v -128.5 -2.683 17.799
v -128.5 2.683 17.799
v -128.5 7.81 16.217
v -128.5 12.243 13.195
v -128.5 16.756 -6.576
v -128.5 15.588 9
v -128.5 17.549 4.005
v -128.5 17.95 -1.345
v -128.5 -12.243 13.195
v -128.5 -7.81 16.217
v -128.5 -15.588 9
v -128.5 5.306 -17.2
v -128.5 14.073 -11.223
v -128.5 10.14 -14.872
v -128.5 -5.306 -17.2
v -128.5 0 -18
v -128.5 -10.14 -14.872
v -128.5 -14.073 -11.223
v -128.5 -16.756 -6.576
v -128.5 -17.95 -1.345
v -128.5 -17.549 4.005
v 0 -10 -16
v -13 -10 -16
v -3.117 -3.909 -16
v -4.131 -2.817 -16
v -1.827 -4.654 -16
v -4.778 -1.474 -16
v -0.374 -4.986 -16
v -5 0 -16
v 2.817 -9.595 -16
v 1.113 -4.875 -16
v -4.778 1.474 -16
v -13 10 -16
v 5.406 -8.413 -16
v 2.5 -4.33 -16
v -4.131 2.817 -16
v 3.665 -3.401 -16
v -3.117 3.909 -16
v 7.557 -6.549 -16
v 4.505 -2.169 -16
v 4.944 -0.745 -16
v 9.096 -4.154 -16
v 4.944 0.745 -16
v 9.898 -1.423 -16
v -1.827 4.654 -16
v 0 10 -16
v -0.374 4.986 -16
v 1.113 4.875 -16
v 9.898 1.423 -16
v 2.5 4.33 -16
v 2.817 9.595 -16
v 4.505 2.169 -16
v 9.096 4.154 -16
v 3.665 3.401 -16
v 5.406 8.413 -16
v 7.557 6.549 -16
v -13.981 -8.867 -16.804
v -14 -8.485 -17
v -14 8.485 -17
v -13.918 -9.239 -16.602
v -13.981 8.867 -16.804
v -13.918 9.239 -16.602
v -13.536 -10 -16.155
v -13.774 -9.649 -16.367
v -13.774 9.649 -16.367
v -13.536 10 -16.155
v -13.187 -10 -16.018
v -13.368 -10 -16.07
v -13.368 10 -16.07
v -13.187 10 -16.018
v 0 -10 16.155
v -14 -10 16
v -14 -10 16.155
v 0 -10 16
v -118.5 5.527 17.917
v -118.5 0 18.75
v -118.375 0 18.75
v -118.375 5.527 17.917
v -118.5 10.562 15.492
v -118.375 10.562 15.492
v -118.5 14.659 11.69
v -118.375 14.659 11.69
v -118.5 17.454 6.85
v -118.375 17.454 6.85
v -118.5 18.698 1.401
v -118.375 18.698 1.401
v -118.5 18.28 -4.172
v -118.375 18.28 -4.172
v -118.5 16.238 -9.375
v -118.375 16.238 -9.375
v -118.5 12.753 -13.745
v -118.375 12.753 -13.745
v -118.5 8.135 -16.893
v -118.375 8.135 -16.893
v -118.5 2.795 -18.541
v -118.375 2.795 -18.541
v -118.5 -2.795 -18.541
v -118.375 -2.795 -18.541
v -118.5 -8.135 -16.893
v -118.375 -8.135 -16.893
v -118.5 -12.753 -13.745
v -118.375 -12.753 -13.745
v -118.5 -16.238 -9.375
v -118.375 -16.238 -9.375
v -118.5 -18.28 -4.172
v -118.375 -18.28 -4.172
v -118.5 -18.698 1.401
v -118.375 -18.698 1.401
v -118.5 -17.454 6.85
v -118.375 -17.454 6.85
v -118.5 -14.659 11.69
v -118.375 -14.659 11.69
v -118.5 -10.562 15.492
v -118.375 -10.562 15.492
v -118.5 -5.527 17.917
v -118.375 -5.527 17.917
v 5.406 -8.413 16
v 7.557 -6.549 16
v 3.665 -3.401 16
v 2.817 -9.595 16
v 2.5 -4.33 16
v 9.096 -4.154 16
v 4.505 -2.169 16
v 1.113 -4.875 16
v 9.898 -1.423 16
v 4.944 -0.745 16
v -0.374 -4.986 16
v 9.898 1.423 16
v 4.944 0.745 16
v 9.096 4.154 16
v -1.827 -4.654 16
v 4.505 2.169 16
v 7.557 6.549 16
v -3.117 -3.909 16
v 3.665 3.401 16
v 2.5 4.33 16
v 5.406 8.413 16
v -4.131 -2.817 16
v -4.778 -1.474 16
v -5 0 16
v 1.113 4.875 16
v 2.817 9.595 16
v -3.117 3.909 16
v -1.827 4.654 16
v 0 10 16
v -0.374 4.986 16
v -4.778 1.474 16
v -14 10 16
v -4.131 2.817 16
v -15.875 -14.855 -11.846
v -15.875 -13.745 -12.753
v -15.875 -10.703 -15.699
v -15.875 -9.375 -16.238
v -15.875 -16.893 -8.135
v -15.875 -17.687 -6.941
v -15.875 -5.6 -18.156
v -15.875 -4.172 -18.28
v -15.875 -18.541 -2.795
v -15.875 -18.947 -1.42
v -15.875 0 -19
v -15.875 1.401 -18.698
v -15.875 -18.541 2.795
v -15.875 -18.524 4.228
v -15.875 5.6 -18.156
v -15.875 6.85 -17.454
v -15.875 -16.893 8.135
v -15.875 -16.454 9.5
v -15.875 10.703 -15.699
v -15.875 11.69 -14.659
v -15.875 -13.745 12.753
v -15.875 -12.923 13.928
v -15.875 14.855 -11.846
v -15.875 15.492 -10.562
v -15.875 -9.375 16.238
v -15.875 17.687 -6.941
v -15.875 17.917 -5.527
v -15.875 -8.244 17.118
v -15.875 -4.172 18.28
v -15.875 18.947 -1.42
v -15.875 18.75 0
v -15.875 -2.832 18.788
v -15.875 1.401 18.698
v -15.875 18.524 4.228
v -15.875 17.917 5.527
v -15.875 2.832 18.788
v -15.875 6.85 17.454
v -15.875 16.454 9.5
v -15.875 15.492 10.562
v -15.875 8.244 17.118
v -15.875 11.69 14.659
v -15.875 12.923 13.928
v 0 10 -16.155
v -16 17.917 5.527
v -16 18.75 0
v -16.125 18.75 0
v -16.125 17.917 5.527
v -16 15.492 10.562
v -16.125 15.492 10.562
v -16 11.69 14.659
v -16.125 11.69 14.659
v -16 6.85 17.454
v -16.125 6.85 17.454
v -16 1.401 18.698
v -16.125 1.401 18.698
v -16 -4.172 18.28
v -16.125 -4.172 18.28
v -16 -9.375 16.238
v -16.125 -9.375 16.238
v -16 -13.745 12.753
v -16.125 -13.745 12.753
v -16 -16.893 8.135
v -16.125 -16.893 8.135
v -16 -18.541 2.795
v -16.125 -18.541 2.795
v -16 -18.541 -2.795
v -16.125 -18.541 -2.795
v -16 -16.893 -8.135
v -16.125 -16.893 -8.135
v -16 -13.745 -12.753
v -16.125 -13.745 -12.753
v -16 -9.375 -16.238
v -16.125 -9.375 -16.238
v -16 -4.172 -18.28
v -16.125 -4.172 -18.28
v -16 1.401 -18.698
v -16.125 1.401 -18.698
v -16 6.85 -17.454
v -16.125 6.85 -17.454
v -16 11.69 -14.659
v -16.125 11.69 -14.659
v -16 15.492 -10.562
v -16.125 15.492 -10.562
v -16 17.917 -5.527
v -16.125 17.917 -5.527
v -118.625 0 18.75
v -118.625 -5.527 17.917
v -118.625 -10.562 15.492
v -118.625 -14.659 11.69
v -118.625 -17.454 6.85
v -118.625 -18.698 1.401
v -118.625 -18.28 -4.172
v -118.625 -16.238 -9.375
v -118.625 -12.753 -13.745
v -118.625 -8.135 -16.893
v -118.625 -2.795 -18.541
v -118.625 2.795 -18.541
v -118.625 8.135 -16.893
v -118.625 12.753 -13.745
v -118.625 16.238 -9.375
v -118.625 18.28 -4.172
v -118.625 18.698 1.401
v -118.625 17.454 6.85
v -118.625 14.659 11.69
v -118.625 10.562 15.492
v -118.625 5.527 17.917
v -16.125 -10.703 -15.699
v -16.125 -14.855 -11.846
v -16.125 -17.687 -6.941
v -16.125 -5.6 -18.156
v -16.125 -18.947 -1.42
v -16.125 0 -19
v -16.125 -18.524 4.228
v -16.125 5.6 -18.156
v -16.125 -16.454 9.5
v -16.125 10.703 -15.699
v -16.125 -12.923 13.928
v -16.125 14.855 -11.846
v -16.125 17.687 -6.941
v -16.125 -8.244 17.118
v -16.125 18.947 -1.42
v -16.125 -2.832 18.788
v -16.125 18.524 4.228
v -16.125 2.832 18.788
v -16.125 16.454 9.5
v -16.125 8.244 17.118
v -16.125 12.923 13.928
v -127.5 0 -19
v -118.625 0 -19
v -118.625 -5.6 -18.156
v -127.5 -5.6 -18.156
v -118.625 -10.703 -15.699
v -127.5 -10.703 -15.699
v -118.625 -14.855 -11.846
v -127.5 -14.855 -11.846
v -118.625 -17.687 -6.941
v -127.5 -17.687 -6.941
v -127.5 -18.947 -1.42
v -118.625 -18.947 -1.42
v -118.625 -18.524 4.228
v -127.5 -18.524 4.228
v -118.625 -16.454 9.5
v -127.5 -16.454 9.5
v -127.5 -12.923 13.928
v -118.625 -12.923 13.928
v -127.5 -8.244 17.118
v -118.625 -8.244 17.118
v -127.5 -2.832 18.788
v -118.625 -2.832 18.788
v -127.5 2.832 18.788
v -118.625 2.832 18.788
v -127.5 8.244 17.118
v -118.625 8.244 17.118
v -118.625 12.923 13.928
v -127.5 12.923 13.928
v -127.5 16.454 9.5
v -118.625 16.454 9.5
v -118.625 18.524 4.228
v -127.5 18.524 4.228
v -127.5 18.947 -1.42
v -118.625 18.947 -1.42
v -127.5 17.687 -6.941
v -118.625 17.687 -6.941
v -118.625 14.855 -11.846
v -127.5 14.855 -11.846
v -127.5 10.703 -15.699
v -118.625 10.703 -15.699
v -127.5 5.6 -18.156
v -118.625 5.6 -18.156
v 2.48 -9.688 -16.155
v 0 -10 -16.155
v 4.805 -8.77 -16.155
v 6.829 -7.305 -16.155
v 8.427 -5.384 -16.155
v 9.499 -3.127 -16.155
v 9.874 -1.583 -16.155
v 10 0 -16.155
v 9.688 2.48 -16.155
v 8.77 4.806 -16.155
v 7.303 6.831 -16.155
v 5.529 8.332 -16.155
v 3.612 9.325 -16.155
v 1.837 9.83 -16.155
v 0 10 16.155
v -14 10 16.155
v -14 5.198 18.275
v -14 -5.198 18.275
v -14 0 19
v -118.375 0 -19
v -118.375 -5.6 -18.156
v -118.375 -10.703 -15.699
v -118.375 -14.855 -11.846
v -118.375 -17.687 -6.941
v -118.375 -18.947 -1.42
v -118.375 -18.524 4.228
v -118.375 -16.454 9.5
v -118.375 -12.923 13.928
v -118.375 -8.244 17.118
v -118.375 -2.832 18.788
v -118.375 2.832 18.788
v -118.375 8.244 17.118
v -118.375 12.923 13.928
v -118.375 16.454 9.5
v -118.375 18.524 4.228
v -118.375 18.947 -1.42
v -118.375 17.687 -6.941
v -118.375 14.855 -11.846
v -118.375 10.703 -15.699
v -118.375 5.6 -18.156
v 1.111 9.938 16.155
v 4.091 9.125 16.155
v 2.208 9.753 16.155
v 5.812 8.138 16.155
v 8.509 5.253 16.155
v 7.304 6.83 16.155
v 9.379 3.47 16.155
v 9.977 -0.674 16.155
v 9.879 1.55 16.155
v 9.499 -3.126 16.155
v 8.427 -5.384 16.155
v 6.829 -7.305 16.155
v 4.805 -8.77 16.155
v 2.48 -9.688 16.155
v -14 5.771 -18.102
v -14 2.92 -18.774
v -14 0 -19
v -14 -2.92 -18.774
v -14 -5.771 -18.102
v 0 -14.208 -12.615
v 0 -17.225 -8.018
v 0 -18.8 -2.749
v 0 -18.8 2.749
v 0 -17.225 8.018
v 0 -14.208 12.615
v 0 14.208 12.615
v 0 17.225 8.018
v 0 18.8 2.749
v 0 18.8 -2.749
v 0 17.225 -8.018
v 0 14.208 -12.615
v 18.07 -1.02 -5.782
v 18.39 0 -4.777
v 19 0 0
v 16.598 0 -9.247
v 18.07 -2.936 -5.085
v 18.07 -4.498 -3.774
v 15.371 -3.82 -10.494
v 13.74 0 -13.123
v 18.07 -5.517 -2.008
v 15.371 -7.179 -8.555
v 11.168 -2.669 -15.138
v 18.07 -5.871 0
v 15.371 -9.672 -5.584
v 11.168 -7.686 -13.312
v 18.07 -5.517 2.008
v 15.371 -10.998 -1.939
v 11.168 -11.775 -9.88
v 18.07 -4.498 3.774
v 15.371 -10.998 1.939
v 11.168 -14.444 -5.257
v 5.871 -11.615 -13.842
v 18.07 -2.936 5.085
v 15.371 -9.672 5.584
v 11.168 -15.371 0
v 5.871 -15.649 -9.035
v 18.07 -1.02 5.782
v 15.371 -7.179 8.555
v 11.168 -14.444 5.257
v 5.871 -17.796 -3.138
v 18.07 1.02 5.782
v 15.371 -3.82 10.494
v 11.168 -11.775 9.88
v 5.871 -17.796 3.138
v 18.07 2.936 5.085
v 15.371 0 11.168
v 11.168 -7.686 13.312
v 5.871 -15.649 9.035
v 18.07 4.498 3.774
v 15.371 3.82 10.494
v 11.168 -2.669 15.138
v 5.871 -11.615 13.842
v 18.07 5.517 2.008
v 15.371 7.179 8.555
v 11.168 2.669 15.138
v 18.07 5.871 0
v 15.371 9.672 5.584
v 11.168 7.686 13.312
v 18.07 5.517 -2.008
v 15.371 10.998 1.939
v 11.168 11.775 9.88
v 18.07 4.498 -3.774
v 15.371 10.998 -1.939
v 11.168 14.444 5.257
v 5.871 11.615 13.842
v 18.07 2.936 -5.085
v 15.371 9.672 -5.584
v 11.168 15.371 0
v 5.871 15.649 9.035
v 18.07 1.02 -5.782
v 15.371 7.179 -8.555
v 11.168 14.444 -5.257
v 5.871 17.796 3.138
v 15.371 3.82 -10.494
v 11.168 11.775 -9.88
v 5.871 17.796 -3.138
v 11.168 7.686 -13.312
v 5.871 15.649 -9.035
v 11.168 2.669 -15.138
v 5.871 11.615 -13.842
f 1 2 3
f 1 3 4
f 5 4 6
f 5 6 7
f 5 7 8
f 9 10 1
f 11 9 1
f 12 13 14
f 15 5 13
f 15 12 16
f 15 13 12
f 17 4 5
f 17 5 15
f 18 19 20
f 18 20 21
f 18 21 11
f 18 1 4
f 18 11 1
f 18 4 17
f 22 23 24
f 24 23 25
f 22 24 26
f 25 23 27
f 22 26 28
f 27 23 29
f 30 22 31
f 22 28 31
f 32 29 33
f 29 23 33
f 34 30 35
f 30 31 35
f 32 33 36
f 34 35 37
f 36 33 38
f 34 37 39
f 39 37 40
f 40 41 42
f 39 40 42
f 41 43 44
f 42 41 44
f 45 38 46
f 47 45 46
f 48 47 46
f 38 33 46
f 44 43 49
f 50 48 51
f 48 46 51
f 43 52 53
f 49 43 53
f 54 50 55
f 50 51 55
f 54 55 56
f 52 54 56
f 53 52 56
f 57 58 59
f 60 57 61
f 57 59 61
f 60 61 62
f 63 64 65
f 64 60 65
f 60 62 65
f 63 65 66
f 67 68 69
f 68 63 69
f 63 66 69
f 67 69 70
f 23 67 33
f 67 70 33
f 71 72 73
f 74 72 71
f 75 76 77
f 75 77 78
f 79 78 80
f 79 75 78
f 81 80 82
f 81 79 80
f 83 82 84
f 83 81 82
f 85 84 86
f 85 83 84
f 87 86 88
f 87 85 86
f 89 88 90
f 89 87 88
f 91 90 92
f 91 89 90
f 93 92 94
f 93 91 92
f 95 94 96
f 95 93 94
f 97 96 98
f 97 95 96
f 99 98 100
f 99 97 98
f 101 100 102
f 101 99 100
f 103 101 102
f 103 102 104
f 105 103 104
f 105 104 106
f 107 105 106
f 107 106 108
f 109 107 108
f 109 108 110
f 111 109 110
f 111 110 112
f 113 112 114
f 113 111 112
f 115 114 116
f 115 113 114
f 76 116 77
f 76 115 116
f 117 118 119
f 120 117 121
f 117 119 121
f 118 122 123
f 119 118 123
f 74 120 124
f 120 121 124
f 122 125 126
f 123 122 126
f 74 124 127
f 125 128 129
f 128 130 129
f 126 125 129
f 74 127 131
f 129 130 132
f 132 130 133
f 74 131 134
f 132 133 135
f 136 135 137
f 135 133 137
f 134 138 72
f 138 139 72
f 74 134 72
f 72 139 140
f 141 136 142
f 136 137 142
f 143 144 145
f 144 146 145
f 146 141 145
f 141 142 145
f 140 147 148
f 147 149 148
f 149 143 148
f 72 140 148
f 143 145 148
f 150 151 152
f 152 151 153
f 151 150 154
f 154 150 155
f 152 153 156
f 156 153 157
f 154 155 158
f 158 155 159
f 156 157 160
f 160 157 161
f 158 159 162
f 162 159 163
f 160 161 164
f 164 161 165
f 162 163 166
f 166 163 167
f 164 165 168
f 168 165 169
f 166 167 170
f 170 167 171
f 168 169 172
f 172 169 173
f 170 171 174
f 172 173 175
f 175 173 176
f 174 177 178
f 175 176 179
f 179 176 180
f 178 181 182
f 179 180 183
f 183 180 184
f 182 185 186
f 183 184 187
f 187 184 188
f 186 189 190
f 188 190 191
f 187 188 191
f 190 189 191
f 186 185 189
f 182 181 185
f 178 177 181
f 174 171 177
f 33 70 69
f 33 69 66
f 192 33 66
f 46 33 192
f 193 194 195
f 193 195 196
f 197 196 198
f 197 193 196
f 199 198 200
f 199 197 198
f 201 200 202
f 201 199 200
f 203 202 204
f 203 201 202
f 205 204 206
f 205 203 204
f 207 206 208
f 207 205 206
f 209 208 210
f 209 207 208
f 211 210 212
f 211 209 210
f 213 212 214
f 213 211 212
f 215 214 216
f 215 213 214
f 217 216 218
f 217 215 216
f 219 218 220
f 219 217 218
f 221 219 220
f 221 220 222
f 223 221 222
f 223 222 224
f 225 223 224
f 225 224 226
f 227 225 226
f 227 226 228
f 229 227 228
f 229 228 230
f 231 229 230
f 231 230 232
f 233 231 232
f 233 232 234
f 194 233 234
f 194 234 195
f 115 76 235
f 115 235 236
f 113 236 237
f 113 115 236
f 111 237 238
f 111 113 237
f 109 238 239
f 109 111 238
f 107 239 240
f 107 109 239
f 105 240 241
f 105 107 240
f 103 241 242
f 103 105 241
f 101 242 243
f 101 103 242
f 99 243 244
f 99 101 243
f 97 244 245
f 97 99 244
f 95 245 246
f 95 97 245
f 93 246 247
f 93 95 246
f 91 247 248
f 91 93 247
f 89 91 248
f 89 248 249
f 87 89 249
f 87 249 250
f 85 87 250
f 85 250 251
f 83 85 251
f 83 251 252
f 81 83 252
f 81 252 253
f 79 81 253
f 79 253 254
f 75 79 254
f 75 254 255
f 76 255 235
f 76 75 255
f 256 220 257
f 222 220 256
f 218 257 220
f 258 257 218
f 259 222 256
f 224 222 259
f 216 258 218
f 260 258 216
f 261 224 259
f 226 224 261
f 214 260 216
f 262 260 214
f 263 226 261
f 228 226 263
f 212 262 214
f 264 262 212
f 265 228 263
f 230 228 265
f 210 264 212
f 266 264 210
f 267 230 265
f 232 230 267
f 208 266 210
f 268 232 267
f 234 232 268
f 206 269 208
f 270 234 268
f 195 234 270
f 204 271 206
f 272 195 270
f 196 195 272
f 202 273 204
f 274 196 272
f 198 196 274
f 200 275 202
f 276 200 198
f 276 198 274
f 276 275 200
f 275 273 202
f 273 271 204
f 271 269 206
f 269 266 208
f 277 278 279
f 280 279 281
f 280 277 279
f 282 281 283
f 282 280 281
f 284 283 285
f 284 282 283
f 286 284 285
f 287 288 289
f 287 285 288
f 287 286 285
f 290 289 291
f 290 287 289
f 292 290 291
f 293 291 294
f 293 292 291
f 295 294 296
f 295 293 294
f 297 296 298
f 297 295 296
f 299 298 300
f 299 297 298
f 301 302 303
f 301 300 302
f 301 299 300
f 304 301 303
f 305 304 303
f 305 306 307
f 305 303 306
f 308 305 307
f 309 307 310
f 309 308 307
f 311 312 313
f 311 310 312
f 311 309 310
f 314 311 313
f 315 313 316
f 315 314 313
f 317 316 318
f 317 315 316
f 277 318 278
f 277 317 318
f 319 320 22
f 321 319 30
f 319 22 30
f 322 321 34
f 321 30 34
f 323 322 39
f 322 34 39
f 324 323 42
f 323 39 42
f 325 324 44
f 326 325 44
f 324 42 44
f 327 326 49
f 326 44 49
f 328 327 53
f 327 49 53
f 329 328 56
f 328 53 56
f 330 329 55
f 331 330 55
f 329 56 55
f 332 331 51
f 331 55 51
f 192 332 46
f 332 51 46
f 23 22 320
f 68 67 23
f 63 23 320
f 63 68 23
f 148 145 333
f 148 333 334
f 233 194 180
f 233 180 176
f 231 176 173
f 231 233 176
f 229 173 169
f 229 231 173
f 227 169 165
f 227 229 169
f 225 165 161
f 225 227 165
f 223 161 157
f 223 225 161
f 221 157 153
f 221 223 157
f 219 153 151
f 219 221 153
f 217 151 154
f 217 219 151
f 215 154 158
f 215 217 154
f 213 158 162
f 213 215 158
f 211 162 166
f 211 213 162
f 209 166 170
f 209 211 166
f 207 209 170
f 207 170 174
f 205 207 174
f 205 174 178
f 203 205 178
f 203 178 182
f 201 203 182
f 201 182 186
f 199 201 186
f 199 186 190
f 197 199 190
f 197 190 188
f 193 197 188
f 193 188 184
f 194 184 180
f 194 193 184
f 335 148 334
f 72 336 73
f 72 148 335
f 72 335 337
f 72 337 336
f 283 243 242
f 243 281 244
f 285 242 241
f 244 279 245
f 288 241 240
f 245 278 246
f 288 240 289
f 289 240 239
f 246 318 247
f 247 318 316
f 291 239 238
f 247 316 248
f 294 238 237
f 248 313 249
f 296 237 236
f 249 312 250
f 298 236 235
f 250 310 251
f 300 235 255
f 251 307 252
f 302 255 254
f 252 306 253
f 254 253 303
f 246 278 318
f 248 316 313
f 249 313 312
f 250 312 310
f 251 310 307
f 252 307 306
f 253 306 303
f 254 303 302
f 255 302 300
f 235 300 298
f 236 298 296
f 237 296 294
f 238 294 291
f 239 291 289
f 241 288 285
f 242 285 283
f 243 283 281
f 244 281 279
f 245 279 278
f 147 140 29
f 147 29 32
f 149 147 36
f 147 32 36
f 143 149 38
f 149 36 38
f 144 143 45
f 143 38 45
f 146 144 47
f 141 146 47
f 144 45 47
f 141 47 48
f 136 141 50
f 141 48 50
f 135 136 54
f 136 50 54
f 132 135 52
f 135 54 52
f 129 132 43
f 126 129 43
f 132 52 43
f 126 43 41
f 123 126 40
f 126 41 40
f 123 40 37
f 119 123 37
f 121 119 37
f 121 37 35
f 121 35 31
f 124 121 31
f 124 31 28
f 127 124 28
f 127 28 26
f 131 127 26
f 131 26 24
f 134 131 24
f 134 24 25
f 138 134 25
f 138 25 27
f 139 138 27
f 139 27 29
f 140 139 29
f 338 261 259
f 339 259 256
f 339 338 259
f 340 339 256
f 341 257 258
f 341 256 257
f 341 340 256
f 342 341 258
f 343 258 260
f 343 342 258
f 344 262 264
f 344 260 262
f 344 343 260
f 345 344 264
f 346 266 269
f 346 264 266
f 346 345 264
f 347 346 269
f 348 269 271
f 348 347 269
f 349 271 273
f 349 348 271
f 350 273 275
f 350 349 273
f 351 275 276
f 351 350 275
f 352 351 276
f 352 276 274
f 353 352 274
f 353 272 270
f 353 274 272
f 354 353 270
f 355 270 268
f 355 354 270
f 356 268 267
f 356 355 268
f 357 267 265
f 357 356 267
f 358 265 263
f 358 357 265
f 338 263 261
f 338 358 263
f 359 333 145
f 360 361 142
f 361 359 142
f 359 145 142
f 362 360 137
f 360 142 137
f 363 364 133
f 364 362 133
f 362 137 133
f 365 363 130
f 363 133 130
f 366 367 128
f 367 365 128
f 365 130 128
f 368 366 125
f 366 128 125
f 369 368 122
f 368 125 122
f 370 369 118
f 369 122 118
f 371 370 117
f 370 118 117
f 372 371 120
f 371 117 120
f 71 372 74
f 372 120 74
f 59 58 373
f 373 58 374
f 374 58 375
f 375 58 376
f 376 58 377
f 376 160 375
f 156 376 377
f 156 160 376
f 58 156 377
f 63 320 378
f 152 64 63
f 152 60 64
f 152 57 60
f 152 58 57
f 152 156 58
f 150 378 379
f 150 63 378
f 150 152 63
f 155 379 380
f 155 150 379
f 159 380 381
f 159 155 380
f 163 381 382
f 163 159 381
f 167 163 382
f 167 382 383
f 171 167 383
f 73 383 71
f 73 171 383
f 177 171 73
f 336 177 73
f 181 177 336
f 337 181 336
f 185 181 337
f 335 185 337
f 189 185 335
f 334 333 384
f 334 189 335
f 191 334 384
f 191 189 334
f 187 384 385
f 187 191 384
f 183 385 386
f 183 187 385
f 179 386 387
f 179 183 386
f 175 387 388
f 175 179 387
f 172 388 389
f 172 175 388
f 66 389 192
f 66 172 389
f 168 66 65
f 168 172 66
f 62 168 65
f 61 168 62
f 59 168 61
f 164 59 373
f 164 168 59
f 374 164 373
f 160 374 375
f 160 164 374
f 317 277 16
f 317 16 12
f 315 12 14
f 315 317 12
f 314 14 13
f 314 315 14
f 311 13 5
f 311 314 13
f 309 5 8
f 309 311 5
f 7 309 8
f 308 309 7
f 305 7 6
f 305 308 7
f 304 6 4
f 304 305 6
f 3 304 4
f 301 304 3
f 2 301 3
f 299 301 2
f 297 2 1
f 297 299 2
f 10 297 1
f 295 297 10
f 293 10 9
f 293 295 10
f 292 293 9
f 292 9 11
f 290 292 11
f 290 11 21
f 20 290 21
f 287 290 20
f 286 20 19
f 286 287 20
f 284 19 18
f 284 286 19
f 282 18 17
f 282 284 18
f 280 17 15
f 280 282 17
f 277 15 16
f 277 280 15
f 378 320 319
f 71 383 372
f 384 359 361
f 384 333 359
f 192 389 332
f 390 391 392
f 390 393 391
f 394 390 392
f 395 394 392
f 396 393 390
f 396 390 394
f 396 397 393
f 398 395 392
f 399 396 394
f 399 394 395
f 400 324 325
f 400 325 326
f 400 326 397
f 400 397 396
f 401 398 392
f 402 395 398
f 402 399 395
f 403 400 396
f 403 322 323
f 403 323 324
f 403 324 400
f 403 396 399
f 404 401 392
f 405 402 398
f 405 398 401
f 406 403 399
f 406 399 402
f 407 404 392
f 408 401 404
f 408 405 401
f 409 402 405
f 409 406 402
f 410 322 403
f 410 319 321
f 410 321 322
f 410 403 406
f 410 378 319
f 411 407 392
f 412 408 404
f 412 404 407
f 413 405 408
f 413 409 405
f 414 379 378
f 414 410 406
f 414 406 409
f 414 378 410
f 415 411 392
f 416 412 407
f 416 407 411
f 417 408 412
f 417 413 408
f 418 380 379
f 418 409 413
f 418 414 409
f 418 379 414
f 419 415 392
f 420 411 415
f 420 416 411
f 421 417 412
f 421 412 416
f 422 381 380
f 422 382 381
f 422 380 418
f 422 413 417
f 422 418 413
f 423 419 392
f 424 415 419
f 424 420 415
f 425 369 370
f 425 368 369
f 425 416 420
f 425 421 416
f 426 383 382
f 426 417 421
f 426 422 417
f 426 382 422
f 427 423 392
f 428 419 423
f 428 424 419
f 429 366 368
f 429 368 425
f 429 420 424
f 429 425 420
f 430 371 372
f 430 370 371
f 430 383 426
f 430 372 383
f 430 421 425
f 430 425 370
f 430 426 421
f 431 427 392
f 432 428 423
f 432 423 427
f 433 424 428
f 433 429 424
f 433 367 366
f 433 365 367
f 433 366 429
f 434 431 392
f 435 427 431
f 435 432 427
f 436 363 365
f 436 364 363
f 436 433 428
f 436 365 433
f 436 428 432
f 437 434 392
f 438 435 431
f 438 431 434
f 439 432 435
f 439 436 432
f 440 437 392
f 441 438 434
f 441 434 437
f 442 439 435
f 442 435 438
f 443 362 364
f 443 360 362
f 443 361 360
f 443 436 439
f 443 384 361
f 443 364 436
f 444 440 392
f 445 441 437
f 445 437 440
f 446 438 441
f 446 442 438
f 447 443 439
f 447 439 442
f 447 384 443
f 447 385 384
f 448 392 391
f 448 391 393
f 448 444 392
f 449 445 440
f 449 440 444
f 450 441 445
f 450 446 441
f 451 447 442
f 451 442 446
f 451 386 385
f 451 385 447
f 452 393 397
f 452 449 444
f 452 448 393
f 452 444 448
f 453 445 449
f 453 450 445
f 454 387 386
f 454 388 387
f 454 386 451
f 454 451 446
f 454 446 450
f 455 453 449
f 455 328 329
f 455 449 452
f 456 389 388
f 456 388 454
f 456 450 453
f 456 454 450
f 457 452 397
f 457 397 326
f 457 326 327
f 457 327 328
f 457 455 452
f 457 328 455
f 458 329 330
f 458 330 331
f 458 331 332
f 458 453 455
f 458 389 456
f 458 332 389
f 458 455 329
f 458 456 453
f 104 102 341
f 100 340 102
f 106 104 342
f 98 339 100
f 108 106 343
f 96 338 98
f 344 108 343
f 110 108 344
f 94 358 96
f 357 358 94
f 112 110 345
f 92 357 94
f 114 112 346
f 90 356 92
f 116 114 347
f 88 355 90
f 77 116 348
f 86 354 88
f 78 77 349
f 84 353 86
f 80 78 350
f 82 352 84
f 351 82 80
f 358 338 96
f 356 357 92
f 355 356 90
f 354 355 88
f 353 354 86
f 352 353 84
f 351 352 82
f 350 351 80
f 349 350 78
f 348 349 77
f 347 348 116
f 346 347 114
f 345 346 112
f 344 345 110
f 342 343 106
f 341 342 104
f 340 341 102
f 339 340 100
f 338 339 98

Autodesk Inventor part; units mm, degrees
sketch "Body" plane through (0, 0, 0) normal (0, 1, 0) x (-1, 0, 0)
  circle A0 centre (0, 0) radius 5
  circle A1 centre (0, 0) radius 19
  line L0 (0, -19) -> (128.5, -19)
  line L1 (128.5, -19) -> (128.5, 19)
  line L2 (128.5, 19) -> (0, 19)
  line L3 (0, 19) -> (0, -19)
  line L4 (158, 0) -> (-48.5, 0) construction
  line L5 (0, -26.6) -> (0, 26.6) construction
  line L6 (-19, 0) -> (128.5, 0)
  point P0 (0, 0)
  dimension "d0" = 10
  dimension "d1" = 38
  dimension "d2" = 38
  dimension "d3" = 128.5
revolve "BodyFeature" add sketch "Body" angle 360 about axis through (19, 0, 0) along (-1, 0, 0) picked at (14.1328, -1.7802) picked at (1.7623, -2.8047) picked at (-1.7802, -14.1328) picked at (-0.3709, -3.2915) contours L6 A1 L3 A0 | A0 L3 L6 | L3 A1 L6 A0 | A0 L6 L3 | L6 L1 L0 A1
ref_plane "Work Plane1" through (0, 0, -16) normal (0, 0, 1) x (1, 0, 0)
ref_plane "Work Plane2" through (0, 0, 16) normal (0, 0, 1) x (1, 0, 0)
sketch "Sketch2" plane through (0, 0, -16) normal (0, 0, 1) x (1, 0, 0)
  arc A0 (0, -19) -> (0, 19) centre (0, 0) ccw projected
  arc A1 (0, -10) -> (0, 10) centre (0, 0) ccw
  line L0 (0, -19) -> (0, -10) construction
  line L1 (0, 19) -> (0, -19) construction
  line L2 (0, -10) -> (-14, -10)
  line L3 (-14, -10) -> (-14, 10)
  line L4 (-14, 10) -> (0, 10)
  line L5 (-14, 10) -> (-14, -10)
  dimension "d7" = 10
  dimension "d8" = 14
extrude "Extrusion1" cut sketch "Sketch2" against normal through all
mirror "Mirror1" about plane through (0, 0, 0) normal (0, 0, 1) of "Extrusion1"
sketch "Sketch3" plane through (0, 0, -16) normal (0, 0, -1) x (-1, 0, 0)
  circle A0 centre (0, 0) radius 5
  dimension "d11" = 10
extrude "Extrusion2" cut sketch "Sketch3" against normal through all
fillet "Fillet1" radius 1 1 edges at (-14, 0, -16)
ref_plane "Work Plane3" through (-16, 0, 0) normal (1, 0, 0) x (0, 1, 0)
sketch "Sketch4" plane through (-16, 0, 0) normal (1, 0, 0) x (0, 1, 0)
  circle A0 centre (0, 0) radius 19 projected
  circle A1 centre (0, 0) radius 18.75
  dimension "d16" = 0.25
extrude "Extrusion3" cut sketch "Sketch4" along normal mid plane 0.25
ref_plane "Work Plane4" through (-118.5, 0, 0) normal (-1, 0, 0) x (0, 0, 1)
sketch "Sketch5" plane through (-118.5, 0, 0) normal (-1, 0, 0) x (0, 0, 1)
  circle A0 centre (0, 0) radius 19 projected
  circle A1 centre (0, 0) radius 18.75
  dimension "d20" = 0.25
extrude "Extrusion4" cut sketch "Sketch5" along normal mid plane 0.25
chamfer "Chamfer1" distance 1 angle 45 1 edges at (-128.5, 0, 19)
properties part number "ANT-38-Body"
